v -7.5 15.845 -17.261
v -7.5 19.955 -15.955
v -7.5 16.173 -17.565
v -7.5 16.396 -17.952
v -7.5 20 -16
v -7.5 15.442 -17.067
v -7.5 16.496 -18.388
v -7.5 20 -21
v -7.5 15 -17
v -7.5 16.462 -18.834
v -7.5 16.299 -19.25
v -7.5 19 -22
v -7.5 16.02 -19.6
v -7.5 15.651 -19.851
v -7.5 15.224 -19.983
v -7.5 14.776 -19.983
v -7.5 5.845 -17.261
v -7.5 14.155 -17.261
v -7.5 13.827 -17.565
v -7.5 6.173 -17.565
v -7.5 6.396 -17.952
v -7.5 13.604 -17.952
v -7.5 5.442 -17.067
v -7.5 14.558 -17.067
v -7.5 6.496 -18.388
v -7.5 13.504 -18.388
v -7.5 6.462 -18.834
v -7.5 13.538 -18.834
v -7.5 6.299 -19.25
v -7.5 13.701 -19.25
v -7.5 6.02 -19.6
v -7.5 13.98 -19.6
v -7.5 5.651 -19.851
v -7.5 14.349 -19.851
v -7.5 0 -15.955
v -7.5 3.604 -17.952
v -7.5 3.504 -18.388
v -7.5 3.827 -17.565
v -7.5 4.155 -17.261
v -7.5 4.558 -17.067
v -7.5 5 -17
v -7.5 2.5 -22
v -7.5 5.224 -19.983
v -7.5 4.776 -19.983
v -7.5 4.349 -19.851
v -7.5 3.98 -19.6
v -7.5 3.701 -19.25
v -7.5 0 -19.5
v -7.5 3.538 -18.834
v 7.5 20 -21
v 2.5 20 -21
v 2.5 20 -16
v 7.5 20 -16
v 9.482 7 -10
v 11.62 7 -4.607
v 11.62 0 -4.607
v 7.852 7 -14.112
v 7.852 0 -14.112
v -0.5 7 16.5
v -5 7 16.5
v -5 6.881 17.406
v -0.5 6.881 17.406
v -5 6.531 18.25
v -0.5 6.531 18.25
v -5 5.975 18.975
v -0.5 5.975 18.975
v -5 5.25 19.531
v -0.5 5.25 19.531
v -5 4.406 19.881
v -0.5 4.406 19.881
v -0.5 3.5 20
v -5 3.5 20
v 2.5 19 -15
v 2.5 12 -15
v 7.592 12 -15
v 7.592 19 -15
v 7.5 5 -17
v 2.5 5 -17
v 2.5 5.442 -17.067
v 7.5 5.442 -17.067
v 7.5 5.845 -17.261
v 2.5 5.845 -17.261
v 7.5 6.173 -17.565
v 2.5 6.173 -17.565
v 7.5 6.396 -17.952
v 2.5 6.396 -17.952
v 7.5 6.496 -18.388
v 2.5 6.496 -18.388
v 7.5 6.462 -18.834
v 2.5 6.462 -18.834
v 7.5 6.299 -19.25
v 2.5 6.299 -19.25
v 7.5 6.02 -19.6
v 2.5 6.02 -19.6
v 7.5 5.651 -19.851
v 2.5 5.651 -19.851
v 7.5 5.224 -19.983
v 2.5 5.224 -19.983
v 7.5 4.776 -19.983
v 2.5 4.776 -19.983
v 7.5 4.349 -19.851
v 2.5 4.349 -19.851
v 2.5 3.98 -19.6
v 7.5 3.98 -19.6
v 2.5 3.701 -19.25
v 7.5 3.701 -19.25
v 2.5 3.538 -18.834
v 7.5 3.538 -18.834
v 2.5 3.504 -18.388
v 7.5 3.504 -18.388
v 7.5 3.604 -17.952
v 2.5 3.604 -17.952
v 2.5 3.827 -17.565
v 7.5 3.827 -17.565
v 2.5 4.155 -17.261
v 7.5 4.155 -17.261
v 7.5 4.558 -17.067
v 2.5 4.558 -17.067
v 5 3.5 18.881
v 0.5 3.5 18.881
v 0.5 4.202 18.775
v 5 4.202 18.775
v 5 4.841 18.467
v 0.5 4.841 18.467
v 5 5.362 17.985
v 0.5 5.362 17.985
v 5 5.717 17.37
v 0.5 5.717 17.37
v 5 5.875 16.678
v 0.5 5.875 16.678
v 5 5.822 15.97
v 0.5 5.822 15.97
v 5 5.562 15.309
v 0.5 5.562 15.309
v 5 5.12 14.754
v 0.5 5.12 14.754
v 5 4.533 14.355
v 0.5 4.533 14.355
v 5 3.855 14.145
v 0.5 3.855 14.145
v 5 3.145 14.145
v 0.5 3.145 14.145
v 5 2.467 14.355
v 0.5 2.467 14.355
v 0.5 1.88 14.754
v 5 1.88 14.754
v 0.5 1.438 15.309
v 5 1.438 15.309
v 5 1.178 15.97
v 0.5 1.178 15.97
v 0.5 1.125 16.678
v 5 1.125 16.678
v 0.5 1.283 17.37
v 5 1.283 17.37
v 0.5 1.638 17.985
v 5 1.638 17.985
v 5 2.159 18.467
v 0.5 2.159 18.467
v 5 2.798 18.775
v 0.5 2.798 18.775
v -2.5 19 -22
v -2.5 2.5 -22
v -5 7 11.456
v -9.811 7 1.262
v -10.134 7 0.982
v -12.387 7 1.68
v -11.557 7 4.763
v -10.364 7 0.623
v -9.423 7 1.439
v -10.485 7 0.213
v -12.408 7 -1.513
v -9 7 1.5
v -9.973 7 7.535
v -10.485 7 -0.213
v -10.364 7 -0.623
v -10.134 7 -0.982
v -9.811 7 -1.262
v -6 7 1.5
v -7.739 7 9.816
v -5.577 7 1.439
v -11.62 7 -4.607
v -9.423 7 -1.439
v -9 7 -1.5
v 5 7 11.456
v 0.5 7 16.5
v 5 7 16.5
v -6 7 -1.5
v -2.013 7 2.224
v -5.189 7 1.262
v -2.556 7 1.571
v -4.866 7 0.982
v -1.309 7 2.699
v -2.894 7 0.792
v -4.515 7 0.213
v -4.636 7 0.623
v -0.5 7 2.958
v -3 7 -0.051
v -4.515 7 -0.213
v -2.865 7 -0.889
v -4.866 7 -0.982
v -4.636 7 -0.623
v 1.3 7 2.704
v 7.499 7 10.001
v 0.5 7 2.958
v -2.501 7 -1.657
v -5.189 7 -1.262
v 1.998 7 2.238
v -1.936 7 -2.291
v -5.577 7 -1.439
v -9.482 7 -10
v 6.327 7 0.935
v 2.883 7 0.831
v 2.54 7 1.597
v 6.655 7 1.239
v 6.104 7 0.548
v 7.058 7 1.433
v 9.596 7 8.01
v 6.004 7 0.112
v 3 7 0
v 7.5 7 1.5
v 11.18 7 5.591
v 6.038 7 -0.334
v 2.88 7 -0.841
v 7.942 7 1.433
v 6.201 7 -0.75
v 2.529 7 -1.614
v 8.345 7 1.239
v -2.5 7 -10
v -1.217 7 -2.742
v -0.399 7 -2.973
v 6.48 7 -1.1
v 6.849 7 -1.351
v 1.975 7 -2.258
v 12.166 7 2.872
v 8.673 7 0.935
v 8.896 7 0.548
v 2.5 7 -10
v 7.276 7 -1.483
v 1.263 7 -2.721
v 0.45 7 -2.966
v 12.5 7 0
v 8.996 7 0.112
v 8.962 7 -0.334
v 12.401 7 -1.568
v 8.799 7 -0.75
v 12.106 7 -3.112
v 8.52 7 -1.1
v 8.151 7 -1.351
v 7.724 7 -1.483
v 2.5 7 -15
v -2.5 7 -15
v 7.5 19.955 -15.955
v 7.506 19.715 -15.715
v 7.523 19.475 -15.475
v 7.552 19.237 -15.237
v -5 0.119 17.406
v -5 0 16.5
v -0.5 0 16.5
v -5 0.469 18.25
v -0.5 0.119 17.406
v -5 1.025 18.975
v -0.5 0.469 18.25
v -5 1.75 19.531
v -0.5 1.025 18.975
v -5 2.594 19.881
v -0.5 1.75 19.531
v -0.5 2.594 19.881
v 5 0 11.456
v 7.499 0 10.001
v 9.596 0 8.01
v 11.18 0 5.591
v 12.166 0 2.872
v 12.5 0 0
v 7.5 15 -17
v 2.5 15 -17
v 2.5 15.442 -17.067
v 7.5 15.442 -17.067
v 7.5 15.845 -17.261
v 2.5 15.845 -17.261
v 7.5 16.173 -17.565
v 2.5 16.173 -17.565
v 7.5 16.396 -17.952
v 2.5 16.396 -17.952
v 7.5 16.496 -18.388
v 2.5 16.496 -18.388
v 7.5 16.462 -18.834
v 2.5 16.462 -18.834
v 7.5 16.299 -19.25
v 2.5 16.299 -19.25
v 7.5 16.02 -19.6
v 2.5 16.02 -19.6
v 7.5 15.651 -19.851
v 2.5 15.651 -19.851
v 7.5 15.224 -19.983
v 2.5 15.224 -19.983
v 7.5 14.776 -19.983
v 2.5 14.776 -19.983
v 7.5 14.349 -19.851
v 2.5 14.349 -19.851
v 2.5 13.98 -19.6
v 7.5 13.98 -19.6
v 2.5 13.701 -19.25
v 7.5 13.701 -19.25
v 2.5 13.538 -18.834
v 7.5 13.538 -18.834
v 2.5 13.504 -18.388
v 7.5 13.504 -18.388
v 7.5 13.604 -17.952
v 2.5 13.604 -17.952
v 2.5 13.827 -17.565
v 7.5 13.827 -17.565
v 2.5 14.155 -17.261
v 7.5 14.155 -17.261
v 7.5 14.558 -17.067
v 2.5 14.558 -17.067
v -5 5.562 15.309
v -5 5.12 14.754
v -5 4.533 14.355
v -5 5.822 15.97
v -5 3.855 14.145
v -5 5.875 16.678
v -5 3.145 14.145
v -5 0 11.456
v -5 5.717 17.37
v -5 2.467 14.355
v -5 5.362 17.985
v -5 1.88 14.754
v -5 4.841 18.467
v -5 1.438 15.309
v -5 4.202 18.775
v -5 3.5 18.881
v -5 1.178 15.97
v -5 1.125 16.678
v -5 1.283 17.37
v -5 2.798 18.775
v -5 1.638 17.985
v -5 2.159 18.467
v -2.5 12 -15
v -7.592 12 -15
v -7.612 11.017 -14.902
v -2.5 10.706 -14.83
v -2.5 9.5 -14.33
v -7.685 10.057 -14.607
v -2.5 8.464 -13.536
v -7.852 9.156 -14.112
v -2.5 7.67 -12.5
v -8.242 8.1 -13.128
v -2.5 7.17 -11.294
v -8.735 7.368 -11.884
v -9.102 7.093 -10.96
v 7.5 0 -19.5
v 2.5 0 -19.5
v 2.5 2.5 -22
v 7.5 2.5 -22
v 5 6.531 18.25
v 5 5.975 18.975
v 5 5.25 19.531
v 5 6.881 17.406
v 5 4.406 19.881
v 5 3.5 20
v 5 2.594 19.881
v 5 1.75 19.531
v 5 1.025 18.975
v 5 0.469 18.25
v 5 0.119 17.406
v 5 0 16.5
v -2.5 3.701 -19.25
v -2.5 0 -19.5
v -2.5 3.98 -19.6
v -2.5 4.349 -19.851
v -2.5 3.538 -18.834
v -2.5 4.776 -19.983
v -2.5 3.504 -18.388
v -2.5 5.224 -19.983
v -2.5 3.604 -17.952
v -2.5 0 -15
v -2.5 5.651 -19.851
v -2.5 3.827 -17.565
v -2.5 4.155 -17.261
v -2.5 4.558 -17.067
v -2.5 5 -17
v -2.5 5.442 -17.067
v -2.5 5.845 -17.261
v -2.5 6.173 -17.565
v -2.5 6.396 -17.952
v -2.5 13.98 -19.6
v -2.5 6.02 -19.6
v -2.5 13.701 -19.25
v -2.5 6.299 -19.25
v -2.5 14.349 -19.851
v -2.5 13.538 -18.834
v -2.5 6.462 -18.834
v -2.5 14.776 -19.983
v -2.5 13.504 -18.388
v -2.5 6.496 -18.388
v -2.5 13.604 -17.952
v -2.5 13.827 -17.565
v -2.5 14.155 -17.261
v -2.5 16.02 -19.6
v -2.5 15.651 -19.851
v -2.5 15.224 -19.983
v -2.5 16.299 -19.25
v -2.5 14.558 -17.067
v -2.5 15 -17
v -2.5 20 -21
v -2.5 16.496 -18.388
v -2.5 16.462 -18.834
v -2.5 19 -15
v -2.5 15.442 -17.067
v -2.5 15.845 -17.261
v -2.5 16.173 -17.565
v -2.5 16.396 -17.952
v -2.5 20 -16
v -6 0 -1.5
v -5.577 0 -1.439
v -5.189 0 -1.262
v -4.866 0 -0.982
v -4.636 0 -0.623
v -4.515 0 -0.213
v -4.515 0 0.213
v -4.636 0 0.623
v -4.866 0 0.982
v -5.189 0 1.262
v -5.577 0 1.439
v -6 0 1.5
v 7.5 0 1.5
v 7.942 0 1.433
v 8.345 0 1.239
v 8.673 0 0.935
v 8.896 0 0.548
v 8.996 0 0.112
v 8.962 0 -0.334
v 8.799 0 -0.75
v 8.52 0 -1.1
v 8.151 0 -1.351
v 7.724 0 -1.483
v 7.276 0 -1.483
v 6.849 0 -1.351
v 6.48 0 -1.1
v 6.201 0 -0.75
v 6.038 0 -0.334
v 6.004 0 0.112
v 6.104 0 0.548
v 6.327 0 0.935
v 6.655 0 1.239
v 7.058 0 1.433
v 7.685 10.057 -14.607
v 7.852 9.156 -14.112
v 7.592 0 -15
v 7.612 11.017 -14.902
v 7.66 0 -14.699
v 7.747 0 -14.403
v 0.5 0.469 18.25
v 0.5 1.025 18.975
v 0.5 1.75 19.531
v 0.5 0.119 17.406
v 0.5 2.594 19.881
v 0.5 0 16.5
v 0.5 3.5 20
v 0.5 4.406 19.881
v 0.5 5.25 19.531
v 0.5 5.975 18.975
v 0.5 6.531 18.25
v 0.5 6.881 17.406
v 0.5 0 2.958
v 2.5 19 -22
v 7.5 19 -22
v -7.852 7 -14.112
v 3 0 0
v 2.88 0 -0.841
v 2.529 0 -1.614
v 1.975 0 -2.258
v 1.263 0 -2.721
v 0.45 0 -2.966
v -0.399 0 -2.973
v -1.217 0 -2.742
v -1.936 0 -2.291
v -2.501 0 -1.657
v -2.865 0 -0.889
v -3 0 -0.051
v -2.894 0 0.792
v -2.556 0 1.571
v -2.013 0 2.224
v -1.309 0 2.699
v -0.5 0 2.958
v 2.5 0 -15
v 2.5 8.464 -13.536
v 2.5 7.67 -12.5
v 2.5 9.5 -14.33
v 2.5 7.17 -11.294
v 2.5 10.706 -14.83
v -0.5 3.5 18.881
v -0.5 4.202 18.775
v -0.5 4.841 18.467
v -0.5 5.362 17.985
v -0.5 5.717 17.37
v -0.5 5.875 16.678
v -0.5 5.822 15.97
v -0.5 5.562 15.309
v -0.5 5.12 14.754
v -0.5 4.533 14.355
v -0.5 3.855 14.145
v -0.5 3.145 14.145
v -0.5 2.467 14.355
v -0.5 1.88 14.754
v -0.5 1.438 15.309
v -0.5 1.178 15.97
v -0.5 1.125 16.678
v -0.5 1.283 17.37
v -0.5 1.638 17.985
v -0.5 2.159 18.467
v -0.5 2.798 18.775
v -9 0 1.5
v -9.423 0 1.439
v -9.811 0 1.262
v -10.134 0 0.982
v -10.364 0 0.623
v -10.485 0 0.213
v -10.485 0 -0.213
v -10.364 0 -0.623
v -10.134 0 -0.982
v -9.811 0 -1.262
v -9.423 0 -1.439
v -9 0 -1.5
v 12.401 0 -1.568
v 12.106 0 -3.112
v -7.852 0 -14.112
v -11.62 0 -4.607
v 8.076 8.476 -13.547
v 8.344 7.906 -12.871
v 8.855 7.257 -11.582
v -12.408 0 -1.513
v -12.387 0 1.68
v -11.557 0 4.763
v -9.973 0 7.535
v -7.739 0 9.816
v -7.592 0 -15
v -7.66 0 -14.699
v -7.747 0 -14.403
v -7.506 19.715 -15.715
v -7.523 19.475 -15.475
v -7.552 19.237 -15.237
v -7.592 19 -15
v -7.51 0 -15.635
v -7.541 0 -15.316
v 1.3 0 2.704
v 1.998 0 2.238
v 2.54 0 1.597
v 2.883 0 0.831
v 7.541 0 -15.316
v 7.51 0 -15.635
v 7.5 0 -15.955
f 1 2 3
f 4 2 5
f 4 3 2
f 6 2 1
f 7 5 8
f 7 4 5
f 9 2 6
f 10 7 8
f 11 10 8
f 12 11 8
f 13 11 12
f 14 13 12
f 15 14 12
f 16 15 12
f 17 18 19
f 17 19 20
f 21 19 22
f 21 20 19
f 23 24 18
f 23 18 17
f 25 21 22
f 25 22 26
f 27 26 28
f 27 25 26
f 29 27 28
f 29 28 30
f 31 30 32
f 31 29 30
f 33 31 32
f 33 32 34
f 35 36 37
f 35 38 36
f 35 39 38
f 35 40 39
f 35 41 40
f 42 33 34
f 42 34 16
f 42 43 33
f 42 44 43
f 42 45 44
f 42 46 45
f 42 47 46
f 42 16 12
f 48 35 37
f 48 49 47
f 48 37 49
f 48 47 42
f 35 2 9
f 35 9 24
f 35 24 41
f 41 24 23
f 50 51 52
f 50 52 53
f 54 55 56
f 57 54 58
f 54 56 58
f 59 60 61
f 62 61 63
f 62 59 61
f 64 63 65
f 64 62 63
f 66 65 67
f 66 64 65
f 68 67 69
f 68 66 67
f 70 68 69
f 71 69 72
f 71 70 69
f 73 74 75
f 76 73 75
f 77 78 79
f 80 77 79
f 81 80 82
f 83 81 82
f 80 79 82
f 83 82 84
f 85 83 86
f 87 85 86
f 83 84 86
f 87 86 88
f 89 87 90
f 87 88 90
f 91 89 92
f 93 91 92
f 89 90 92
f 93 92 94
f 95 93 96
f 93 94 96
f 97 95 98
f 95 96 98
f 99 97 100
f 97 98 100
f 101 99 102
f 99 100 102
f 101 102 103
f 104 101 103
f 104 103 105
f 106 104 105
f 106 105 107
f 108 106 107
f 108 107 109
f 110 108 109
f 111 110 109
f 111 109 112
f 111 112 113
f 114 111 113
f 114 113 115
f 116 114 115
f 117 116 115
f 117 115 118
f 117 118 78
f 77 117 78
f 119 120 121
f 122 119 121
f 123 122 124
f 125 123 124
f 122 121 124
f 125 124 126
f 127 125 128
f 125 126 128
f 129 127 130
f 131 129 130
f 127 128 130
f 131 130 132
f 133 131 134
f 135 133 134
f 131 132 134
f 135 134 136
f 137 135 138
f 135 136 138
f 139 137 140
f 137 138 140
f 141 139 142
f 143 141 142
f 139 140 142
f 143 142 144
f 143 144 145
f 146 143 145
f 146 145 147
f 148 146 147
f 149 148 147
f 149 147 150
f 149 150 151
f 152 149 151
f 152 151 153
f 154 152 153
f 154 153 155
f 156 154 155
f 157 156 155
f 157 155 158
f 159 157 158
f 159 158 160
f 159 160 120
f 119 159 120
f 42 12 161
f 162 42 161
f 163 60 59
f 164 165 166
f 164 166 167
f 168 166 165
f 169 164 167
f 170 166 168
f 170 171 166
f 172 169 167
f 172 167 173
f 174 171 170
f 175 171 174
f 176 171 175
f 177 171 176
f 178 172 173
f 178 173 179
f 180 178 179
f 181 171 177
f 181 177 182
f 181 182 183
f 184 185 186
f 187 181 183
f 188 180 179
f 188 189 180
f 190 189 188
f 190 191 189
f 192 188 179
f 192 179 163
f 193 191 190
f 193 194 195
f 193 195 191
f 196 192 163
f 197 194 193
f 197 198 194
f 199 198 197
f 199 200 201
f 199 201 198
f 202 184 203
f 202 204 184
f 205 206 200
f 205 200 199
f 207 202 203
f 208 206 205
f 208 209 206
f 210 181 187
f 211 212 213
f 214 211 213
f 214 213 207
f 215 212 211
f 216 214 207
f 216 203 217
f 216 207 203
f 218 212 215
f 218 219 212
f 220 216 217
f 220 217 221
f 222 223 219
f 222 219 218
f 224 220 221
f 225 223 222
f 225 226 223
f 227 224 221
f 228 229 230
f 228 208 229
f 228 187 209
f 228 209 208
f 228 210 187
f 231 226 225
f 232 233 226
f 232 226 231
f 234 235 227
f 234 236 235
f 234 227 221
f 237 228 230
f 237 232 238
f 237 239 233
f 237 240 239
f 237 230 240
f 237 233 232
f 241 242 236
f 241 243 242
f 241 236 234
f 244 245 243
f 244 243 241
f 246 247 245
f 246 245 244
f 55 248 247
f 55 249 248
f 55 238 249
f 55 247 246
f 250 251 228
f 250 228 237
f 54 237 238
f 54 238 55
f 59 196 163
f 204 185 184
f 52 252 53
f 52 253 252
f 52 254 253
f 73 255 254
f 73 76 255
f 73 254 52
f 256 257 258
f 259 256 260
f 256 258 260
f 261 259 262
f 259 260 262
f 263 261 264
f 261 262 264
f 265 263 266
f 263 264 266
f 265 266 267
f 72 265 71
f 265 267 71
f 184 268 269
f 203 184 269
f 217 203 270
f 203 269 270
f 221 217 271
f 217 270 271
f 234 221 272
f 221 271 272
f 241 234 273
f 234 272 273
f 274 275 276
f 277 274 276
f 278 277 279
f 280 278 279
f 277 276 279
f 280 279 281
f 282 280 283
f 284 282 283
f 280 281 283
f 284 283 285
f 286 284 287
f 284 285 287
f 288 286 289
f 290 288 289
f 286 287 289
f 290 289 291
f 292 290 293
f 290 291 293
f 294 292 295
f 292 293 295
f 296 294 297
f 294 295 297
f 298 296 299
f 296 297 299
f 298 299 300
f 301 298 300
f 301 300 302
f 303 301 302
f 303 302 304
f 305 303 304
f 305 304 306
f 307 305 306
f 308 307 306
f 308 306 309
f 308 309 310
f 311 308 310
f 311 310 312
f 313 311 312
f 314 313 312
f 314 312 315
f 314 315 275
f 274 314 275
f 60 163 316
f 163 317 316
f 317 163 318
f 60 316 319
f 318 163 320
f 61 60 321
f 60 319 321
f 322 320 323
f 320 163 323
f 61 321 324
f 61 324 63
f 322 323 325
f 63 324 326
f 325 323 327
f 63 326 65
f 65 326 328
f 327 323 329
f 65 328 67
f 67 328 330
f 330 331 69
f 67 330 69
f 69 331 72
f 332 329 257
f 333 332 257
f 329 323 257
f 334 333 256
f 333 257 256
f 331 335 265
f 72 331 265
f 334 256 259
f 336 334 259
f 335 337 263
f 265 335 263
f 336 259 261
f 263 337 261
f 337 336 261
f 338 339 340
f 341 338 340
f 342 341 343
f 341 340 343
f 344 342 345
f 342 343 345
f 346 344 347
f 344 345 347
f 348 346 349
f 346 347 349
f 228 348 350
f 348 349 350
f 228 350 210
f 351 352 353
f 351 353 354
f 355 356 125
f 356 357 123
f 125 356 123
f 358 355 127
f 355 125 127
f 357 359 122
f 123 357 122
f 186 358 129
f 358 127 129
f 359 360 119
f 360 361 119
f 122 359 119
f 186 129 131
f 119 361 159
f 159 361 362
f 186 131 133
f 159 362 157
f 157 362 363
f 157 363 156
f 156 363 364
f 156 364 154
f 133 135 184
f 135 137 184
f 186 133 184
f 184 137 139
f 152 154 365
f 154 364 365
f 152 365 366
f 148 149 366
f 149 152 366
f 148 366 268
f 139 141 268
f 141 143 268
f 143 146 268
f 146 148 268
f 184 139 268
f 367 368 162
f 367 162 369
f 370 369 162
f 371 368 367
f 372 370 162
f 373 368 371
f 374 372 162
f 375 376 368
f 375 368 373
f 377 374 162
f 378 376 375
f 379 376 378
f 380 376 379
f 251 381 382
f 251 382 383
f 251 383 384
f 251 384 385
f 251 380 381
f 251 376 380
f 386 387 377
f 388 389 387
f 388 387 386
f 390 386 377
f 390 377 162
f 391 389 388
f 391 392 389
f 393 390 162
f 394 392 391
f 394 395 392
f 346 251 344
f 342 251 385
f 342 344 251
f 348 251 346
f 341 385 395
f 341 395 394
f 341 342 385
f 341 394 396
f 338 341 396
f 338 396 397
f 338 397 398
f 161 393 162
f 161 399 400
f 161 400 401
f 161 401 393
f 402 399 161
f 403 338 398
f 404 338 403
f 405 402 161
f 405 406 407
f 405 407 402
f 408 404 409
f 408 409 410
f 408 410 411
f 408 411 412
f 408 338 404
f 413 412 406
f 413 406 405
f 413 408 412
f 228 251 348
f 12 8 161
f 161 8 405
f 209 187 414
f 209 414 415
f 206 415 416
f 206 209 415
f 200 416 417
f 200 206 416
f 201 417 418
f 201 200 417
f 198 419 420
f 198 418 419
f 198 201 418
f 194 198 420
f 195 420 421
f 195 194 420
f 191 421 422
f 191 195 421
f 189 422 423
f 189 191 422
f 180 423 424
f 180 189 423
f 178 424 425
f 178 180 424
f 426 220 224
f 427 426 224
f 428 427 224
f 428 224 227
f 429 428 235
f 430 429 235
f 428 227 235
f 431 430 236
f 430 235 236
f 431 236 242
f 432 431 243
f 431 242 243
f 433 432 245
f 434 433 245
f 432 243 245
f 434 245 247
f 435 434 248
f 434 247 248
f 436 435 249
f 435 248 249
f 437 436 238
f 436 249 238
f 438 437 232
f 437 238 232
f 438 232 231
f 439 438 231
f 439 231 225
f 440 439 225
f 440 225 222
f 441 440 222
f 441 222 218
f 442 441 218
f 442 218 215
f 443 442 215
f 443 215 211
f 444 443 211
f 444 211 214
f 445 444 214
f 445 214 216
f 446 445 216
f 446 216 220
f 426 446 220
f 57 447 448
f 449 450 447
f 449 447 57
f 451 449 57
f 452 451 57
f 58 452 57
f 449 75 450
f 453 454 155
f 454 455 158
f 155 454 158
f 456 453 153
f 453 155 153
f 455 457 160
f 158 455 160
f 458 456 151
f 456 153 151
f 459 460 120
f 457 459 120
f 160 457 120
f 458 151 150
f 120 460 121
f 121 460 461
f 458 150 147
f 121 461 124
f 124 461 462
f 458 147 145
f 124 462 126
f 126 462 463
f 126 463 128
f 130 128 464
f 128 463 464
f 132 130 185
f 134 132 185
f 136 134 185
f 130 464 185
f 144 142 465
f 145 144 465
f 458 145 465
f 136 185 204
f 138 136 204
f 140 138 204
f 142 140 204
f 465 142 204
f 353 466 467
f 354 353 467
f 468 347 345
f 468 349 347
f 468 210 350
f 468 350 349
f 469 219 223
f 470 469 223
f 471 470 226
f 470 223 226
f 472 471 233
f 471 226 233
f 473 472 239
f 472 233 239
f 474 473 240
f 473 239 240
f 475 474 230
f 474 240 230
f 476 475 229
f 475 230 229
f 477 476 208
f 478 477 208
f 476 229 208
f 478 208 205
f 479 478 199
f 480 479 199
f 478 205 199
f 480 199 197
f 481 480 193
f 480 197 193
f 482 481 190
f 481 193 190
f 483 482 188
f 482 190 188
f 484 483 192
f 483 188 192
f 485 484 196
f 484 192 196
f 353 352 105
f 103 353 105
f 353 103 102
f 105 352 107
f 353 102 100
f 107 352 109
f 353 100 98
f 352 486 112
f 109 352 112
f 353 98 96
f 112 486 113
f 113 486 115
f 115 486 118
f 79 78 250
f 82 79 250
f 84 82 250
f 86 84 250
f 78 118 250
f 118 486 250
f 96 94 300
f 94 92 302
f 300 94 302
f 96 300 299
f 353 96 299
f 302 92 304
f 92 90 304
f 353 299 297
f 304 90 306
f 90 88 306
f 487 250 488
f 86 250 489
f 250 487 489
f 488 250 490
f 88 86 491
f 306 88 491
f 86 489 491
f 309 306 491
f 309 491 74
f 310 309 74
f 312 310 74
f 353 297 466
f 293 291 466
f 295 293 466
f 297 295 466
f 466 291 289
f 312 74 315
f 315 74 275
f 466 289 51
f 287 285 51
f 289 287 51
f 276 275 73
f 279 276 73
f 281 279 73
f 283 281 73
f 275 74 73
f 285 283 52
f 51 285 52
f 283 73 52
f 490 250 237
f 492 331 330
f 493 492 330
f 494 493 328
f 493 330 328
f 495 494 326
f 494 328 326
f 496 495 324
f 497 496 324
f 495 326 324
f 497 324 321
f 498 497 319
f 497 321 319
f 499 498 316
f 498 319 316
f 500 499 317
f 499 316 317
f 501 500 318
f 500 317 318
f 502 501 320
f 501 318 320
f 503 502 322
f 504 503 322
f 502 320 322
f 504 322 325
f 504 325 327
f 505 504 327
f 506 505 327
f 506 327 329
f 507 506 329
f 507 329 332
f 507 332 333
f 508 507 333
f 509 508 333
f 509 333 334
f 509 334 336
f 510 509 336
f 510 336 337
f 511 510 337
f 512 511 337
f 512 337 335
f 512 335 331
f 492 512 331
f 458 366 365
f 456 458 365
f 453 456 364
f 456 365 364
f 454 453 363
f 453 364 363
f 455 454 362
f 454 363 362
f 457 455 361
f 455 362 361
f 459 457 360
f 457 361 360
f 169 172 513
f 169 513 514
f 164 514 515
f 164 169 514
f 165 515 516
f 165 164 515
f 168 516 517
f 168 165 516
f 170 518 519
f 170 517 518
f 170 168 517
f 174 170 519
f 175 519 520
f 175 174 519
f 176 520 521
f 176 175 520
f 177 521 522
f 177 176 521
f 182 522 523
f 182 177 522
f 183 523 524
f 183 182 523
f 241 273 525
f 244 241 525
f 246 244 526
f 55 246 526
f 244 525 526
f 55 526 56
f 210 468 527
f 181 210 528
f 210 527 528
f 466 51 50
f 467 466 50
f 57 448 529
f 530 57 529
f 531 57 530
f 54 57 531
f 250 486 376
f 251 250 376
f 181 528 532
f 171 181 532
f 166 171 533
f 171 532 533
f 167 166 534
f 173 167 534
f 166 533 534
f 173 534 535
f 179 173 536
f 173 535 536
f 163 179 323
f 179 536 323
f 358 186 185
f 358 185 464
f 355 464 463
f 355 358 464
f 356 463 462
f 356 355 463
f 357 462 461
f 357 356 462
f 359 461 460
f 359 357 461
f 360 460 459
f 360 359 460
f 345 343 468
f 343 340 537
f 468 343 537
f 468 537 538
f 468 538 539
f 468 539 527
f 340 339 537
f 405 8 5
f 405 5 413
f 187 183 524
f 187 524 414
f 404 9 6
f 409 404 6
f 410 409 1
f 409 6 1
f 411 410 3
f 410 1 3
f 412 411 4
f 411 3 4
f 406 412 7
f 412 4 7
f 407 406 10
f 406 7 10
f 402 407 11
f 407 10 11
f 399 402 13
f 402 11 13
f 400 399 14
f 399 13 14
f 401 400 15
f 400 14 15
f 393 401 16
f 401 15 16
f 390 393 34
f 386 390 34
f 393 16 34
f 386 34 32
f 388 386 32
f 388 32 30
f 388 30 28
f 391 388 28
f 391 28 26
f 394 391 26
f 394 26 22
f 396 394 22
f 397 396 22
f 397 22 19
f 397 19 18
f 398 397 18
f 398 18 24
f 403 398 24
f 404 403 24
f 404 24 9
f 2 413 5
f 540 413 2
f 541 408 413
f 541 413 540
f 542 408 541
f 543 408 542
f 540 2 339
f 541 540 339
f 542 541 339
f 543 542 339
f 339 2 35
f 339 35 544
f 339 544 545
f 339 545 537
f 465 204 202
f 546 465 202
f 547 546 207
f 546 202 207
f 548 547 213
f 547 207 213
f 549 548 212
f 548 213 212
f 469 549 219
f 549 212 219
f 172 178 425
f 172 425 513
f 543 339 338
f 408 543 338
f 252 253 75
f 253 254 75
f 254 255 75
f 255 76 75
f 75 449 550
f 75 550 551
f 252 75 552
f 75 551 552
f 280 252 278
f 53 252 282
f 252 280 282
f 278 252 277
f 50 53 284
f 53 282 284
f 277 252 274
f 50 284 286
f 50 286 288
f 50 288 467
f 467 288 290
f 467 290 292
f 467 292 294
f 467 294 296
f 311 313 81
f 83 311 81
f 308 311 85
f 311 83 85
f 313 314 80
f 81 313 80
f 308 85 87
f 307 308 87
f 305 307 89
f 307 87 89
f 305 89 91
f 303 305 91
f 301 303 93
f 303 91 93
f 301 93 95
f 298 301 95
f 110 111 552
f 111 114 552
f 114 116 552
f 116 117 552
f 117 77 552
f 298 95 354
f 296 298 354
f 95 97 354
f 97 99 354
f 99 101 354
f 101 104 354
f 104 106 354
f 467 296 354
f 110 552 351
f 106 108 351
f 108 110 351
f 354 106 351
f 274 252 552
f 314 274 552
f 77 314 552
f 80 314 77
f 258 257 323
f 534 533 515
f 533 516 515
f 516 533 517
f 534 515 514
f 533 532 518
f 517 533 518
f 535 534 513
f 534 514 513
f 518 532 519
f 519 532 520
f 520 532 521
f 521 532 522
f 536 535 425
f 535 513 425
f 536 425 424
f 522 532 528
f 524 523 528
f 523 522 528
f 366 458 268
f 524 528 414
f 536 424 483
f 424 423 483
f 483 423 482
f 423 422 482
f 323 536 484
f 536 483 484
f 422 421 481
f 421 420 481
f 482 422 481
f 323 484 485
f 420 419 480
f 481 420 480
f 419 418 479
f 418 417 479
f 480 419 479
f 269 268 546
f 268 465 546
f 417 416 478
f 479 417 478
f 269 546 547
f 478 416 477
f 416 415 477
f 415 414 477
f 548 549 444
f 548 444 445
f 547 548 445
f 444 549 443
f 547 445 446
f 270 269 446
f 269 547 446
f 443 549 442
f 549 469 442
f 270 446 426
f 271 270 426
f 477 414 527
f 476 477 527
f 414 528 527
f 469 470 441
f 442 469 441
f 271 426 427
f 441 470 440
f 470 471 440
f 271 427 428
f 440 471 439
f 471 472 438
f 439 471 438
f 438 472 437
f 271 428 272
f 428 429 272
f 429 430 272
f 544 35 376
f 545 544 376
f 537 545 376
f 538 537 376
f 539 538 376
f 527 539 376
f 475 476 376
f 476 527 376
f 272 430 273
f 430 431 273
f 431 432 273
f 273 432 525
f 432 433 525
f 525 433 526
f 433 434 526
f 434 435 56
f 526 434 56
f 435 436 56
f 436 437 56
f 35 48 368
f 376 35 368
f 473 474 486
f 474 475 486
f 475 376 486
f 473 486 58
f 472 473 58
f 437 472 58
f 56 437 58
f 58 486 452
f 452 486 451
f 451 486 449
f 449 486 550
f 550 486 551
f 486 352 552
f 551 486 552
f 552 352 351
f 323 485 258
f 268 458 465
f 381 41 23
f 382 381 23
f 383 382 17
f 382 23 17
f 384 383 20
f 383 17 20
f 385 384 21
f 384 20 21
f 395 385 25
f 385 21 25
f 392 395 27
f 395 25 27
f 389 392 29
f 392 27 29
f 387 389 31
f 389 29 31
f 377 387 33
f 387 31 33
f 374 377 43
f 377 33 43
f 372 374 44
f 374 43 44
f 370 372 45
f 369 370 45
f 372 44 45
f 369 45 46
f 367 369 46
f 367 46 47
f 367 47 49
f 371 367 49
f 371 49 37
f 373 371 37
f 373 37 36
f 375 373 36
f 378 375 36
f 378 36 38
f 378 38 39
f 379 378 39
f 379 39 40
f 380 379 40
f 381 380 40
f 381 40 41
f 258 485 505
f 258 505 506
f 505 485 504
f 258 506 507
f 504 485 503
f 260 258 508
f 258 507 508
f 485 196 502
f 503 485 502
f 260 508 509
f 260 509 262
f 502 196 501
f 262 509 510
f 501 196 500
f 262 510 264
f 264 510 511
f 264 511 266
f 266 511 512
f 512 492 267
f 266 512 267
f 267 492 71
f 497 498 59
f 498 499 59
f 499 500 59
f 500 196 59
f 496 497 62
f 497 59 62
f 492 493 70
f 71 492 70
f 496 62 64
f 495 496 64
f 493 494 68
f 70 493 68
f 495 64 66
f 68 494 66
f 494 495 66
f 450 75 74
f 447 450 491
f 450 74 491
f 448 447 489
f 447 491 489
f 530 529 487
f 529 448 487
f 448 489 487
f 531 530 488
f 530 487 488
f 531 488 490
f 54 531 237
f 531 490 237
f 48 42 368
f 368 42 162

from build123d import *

# Parameters (mm, degrees)
SKETCH1_W           = 5
SKETCH1_H           = 7
BOSS_EXTRUDE1_DEPTH = 7
SKETCH3_R           = 2.38125
CUT_EXTRUDE2_DEPTH  = 29.969811874
FILLET2_R           = 3.5
SKETCH5_W           = 1
SKETCH5_H           = 8.5
CUT_EXTRUDE4_DEPTH  = 27.253571186
SKETCH6_R           = 1.5
CUT_EXTRUDE5_DEPTH  = 27.253571186
SKETCH8_W           = 5
SKETCH8_H           = 7
BOSS_EXTRUDE2_DEPTH = 13
FILLET3_DEPTH       = 20
FILLET3_2_DEPTH     = 8.22694
FILLET3_START       = -9.48212727
FILLET3_3_DEPTH     = 6.98212727
FILLET3_START_2     = 2.5
FILLET3_4_DEPTH     = 6.98212727
FILLET3_START_3     = 7
FILLET3_5_DEPTH     = 13.0000001
CHAMFER1_SIZE       = 2.5
CHAMFER2_SIZE       = 1
SKETCH9_R           = 1.5
CUT_EXTRUDE7_DEPTH  = 36.832945734


with BuildPart() as part:
    # Sketch1 → Boss-Extrude1 (new body)
    with BuildSketch(Plane(origin=(0, 0, 0), x_dir=(1, 0, 0), z_dir=(0, 1, 0))):
        with BuildLine():
            Line((-5, -5), (-5, -11.456439237))
            ThreePointArc((-5, -11.456439237), (0, -12.5), (5, -11.456439237))
            Line((5, -11.456439237), (5, -5))
            Line((5, -5), (-5, -5))
        make_face()
        with BuildLine():
            ThreePointArc((-11.620226592, 4.606553371), (-11.556942324, -4.763096065), (-5, -11.456439237))
            Line((-5, -11.456439237), (-5, -5))
            Line((-5, -5), (5, -5))
            Line((5, -5), (5, -11.456439237))
            ThreePointArc((5, -11.456439237), (10.458250332, -6.846531969), (12.5, 0))
            ThreePointArc((12.5, 0), (12.27808683, 2.344905926), (11.620226592, 4.606553371))
            ThreePointArc((11.620226592, 4.606553371), (0, 12.5), (-11.620226592, 4.606553371))
        make_face()
        with BuildLine():
            Line((-5, -11.456439237), (-5, -20))
            Line((-5, -20), (5, -20))
            Line((5, -20), (5, -11.456439237))
            ThreePointArc((5, -11.456439237), (0, -12.5), (-5, -11.456439237))
        make_face()
        with BuildLine():
            Line((-7.5, 15), (-11.620226592, 4.606553371))
            ThreePointArc((-11.620226592, 4.606553371), (0, 12.5), (11.620226592, 4.606553371))
            Line((11.620226592, 4.606553371), (7.5, 15))
            Line((7.5, 15), (2.5, 15))
            Line((2.5, 15), (-2.5, 15))
            Line((-2.5, 15), (-7.5, 15))
        make_face()
        with Locations((-5, 18.5)):
            Rectangle(SKETCH1_W, SKETCH1_H)
        with Locations((5, 18.5)):
            Rectangle(SKETCH1_W, SKETCH1_H)
    extrude(amount=BOSS_EXTRUDE1_DEPTH)

    # Sketch3 → Cut-Extrude2 (cut, through all)
    with BuildSketch(Plane.ZY.offset(5)):
        with Locations((16.5, 3.5)):
            Circle(SKETCH3_R)
    extrude(amount=-CUT_EXTRUDE2_DEPTH, mode=Mode.SUBTRACT)

    # Fillet2
    fillet2_edges = [part.edges().sort_by_distance(p)[0] for p in [
        (0, 0, 20),
        (0, 7, 20),
    ]]
    fillet(fillet2_edges, radius=FILLET2_R - 0.0001)  # a hair under: the kernel refuses the full size

    # Sketch5 → Cut-Extrude4 (cut, through all)
    with BuildSketch(Plane(origin=(0, 7, 0), x_dir=(1, 0, 0), z_dir=(0, 1, 0))):
        with BuildLine():
            ThreePointArc((3, 0), (-1.936491673, 2.291287847), (-0.5, -2.958039892))
            Line((-0.5, -2.958039892), (-0.5, 0))
            Line((-0.5, 0), (0.5, 0))
            Line((0.5, 0), (0.5, -2.958039892))
            ThreePointArc((0.5, -2.958039892), (2.291287847, -1.936491673), (3, 0))
        make_face()
        with BuildLine():
            Line((-0.5, 0), (-0.5, -2.958039892))
            ThreePointArc((-0.5, -2.958039892), (0, -3), (0.5, -2.958039892))
            Line((0.5, -2.958039892), (0.5, 0))
            Line((0.5, 0), (-0.5, 0))
        make_face()
        with BuildLine():
            Line((-0.5, -2.958039892), (-0.5, -16.5))
            Line((-0.5, -16.5), (0.5, -16.5))
            Line((0.5, -16.5), (0.5, -2.958039892))
            ThreePointArc((0.5, -2.958039892), (0, -3), (-0.5, -2.958039892))
        make_face()
        with Locations((0, -20.75)):
            Rectangle(SKETCH5_W, SKETCH5_H)
    extrude(amount=-CUT_EXTRUDE4_DEPTH, mode=Mode.SUBTRACT)

    # Sketch6 → Cut-Extrude5 (cut, through all)
    with BuildSketch(Plane(origin=(0, 7, 0), x_dir=(1, 0, 0), z_dir=(0, 1, 0))):
        with Locations(Location((7.5, 0, 0), (0, 0, 270))):
            Circle(SKETCH6_R)
        with BuildLine():
            Line((-9, 1.5), (-6, 1.5))
            ThreePointArc((-6, 1.5), (-4.5, 0), (-6, -1.5))
            Line((-6, -1.5), (-9, -1.5))
            ThreePointArc((-9, -1.5), (-10.5, 0), (-9, 1.5))
        make_face()
    extrude(amount=-CUT_EXTRUDE5_DEPTH, mode=Mode.SUBTRACT)

    # Sketch8 → Boss-Extrude2 (add)
    with BuildSketch(Plane(origin=(0, 7, 0), x_dir=(1, 0, 0), z_dir=(0, 1, 0))):
        with Locations((-5, 18.5)):
            Rectangle(SKETCH8_W, SKETCH8_H)
        with Locations((5, 18.5)):
            Rectangle(SKETCH8_W, SKETCH8_H)
    extrude(amount=BOSS_EXTRUDE2_DEPTH)

    # Fillet3: read off the stored shape, not the designer's step
    # Fillet3 outline → Fillet3 (add)
    with BuildSketch(Plane(origin=(0, 0, 0), x_dir=(1, 0, 0), z_dir=(0, 1, 0))):
        with BuildLine():
            Line((7.5, 15), (7.592033284, 15))
            ThreePointArc((7.592033284, 15), (7.523061504, 15.475245132), (7.5, 15.954915028))
            Line((7.5, 15.954915028), (7.5, 15))
        make_face()
        with BuildLine():
            Line((-7.5, 15), (-7.5, 15.954915028))
            ThreePointArc((-7.5, 15.954915028), (-7.523061504, 15.475245132), (-7.592033284, 15))
            Line((-7.592033284, 15), (-7.5, 15))
        make_face()
    extrude(amount=FILLET3_DEPTH)

    # Fillet3 2 outline → Fillet3 2 (add)
    with BuildSketch(Plane(origin=(0, 0, 0), x_dir=(1, 0, 0), z_dir=(0, 1, 0))):
        with BuildLine():
            Line((7.5, 15), (7.851909363, 14.11229368))
            ThreePointArc((7.851909363, 14.11229368), (7.701399823, 14.550124532), (7.592033284, 15))
            Line((7.592033284, 15), (7.5, 15))
        make_face()
        with BuildLine():
            Line((-7.5, 15), (-7.592033284, 15))
            ThreePointArc((-7.592033284, 15), (-7.701399823, 14.550124532), (-7.851909363, 14.11229368))
            Line((-7.851909363, 14.11229368), (-7.5, 15))
        make_face()
    extrude(amount=FILLET3_2_DEPTH)

    # Fillet3 3 outline → Fillet3 3 (add)
    with BuildSketch(Plane.YZ.offset(FILLET3_START)):
        with BuildLine():
            ThreePointArc((12, -15), (8.464466094, -13.535533906), (7, -10))
            Line((7, -10), (7, -15))
            Line((7, -15), (8.22694, -15))
            Line((8.22694, -15), (12, -15))
        make_face()
    extrude(amount=FILLET3_3_DEPTH)

    # Fillet3 4 outline → Fillet3 4 (add)
    with BuildSketch(Plane.YZ.offset(FILLET3_START_2)):
        with BuildLine():
            ThreePointArc((12, -15), (8.464466094, -13.535533906), (7, -10))
            Line((7, -10), (7, -15))
            Line((7, -15), (8.22694, -15))
            Line((8.22694, -15), (12, -15))
        make_face()
    extrude(amount=FILLET3_4_DEPTH)

    # Fillet3 5 outline → Fillet3 5 (cut)
    with BuildSketch(Plane(origin=(0, 0, 0), x_dir=(1, 0, 0), z_dir=(0, 1, 0)).offset(FILLET3_START_3)):
        with BuildLine():
            ThreePointArc((7.592033284, 15), (7.701399823, 14.550124532), (7.851909363, 14.11229368))
            Line((7.851909363, 14.11229368), (9.482127184, 9.999999966))
            Line((9.482127184, 9.999999966), (9.48212727, 15))
            Line((9.48212727, 15), (7.592033284, 15))
        make_face()
        with BuildLine():
            ThreePointArc((-7.851909363, 14.11229368), (-7.701399823, 14.550124532), (-7.592033284, 15))
            Line((-7.592033284, 15), (-9.48212727, 15))
            Line((-9.48212727, 15), (-9.48212727, 10))
            Line((-9.48212727, 10), (-7.851909363, 14.11229368))
        make_face()
    extrude(amount=FILLET3_5_DEPTH, mode=Mode.SUBTRACT)

    # Chamfer1
    chamfer1_edges = [part.edges().sort_by_distance(p)[0] for p in [
        (-5, 0, -22),
        (5, 0, -22),
    ]]
    chamfer(chamfer1_edges, length=CHAMFER1_SIZE)

    # Chamfer2
    chamfer2_edges = [part.edges().sort_by_distance(p)[0] for p in [
        (-5.046016642, 20, -15),
        (5.046016642, 20, -15),
        (5, 20, -22),
        (-5, 20, -22),
    ]]
    chamfer(chamfer2_edges, length=CHAMFER2_SIZE)

    # Sketch9 → Cut-Extrude7 (cut, through all)
    with BuildSketch(Plane.ZY.offset(7.5)):
        with Locations((-18.5, 15)):
            Circle(SKETCH9_R)
        with Locations((-18.5, 5)):
            Circle(SKETCH9_R)
    extrude(amount=-CUT_EXTRUDE7_DEPTH, mode=Mode.SUBTRACT)


solid = part.part
